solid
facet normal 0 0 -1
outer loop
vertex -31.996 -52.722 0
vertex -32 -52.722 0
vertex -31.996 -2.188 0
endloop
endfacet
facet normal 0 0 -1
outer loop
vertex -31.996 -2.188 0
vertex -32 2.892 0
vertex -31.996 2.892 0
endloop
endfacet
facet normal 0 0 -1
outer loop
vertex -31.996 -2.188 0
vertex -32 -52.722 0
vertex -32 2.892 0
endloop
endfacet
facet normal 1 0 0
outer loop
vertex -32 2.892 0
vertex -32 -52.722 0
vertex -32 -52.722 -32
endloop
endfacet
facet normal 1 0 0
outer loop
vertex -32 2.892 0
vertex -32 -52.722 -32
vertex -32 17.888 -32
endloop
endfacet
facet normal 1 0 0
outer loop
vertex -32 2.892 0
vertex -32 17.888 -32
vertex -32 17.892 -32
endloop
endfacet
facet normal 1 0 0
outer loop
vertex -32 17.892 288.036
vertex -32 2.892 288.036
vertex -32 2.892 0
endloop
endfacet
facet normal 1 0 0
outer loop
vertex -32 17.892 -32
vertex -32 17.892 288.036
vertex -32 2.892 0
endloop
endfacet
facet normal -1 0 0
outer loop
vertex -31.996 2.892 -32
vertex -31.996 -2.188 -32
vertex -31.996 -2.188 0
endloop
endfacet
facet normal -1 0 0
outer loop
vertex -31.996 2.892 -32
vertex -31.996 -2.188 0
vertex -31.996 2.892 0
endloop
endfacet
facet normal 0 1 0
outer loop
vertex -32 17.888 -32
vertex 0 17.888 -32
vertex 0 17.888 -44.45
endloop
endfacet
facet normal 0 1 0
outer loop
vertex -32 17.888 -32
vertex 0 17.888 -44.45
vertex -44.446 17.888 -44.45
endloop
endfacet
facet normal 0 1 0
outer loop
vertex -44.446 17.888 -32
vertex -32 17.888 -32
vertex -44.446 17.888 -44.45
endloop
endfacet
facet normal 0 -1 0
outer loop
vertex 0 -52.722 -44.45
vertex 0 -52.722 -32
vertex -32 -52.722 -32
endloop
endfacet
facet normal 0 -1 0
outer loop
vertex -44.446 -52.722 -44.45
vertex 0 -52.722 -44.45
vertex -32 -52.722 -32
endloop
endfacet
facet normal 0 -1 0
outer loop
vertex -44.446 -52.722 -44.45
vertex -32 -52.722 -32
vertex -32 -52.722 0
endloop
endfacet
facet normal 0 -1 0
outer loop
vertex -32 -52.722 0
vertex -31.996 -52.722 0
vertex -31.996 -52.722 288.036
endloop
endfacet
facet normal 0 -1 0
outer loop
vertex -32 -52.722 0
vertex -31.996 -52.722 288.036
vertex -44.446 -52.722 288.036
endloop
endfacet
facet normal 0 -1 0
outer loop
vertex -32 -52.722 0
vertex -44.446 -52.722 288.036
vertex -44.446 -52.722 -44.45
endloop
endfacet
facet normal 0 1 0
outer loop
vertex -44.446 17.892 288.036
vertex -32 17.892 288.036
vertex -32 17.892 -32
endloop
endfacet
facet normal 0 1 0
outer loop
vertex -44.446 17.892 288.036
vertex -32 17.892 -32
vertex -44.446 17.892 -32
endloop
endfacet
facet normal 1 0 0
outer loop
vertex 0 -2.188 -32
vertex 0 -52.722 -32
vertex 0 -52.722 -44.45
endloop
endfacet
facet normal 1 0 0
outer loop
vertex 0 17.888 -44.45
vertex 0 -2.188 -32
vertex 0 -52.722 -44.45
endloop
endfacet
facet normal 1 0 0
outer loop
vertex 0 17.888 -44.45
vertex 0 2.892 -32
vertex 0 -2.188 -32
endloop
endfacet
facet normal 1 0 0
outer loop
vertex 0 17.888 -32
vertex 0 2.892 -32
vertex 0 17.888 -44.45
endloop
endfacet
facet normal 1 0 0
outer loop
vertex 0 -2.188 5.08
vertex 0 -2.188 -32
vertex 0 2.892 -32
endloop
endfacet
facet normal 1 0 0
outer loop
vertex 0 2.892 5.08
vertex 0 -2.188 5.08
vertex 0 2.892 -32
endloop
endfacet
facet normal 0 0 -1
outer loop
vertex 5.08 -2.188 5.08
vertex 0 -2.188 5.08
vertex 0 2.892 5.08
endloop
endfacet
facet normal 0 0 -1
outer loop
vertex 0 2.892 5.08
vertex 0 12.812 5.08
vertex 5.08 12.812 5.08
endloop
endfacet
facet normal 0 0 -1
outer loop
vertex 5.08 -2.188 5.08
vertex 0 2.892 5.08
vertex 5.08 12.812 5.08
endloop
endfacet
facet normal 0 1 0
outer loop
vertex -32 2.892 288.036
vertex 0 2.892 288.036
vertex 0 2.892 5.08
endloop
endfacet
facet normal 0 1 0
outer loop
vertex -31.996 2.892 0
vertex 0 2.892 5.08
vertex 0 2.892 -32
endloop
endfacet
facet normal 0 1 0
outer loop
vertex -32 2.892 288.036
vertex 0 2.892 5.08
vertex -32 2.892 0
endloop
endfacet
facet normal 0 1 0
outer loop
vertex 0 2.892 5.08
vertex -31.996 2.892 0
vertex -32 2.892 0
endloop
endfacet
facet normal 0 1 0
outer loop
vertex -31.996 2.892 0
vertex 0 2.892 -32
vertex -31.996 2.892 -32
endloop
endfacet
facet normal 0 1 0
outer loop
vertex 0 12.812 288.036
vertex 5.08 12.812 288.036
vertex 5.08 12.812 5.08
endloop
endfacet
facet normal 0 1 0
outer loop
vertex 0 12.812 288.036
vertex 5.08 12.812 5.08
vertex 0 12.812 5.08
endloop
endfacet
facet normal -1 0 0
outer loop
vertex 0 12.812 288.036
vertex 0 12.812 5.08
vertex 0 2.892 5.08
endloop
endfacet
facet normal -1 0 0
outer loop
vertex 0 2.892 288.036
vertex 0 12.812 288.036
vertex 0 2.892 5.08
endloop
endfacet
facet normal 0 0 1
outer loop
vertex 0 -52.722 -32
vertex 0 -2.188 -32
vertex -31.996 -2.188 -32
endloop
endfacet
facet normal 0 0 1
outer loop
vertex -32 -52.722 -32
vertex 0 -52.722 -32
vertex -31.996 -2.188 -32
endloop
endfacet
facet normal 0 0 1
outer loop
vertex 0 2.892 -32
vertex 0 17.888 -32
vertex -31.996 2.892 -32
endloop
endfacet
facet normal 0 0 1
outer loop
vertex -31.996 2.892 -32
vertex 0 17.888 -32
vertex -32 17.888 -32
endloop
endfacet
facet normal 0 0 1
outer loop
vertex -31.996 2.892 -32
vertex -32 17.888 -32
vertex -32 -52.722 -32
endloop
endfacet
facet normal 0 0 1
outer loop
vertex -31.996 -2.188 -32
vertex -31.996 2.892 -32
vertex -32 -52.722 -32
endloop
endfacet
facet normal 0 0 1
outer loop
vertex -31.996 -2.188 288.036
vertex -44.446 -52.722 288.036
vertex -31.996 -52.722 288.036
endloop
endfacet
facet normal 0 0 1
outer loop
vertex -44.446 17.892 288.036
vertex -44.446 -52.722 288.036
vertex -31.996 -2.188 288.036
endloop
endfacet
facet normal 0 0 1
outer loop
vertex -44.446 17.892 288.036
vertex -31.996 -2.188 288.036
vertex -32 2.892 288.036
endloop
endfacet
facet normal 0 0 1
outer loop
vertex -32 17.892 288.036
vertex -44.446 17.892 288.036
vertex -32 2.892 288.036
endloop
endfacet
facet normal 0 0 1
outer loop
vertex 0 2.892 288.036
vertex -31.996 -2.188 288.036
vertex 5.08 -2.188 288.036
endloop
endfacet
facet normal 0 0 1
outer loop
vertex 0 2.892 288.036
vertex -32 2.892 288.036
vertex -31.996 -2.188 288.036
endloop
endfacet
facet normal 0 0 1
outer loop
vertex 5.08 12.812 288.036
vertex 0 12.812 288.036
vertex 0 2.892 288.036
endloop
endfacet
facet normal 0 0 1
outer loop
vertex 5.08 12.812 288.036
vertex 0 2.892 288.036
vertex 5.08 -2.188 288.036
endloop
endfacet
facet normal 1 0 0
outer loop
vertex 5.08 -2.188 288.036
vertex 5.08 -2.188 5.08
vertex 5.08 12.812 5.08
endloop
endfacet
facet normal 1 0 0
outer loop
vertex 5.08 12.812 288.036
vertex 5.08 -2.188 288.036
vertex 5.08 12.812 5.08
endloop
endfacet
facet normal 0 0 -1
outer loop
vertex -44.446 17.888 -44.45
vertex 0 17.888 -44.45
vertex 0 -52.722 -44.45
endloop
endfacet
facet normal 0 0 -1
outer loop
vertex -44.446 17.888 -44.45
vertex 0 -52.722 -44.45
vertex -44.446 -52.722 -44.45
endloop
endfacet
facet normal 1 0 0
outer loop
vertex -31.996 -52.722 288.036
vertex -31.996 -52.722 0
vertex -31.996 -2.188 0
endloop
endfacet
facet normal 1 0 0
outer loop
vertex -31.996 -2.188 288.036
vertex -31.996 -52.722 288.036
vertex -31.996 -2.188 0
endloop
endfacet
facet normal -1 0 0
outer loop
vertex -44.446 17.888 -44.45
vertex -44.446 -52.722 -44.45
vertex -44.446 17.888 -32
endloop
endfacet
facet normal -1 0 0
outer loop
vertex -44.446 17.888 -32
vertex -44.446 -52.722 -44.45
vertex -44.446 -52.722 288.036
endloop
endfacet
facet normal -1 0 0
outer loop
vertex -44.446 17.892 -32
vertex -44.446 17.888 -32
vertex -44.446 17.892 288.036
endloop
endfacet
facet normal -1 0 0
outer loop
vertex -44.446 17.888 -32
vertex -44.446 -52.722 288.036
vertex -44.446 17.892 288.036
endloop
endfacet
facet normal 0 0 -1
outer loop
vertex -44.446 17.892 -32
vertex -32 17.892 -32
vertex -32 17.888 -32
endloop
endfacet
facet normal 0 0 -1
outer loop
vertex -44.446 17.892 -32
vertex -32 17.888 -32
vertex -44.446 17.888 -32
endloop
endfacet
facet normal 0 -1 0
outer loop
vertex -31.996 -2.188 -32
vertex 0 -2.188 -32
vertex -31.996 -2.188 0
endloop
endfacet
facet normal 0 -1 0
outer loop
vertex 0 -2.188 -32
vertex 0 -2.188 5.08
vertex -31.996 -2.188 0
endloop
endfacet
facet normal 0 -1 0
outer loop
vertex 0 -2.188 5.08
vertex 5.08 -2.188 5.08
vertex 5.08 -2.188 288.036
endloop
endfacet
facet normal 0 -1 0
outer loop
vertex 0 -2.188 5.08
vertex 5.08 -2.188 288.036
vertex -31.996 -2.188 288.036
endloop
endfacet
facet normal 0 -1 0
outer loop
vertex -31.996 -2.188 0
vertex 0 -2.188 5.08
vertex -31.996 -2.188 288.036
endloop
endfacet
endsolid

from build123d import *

# Parameters (mm, degrees)
BOSS_EXTRUDE1_DEPTH = 288.036
SKETCH2_W           = 5.08
SKETCH2_H           = 5.08
CUT_EXTRUDE1_DEPTH  = 299.722207266
SKETCH3_W           = 12.446
SKETCH3_H           = 70.614516874
SKETCH3_W_2         = 31.996
SKETCH3_H_2         = 5.08
BOSS_EXTRUDE2_DEPTH = 32
SKETCH7_W           = 44.446
SKETCH7_H           = 70.61
BOSS_EXTRUDE3_DEPTH = 12.45


with BuildPart() as part:
    # Sketch1 → Boss-Extrude1 (new body)
    with BuildSketch(Plane.XY):
        Polygon((-44.446, 17.892402527), (-44.446, -52.722114347), (-31.996, -52.722114347), (-31.996, -2.187597473), (5.08, -2.187597473), (5.08, 12.812402527), (0, 12.812402527), (0, 2.892402527), (-32, 2.892402527), (-32, 17.892402527), align=None)
    extrude(amount=BOSS_EXTRUDE1_DEPTH)

    # Sketch2 → Cut-Extrude1 (cut, through all)
    with BuildSketch(Plane(origin=(0, 12.812402527, 0), x_dir=(1, 0, 0), z_dir=(0, 1, 0))):
        with Locations((2.54, -2.54)):
            Rectangle(SKETCH2_W, SKETCH2_H)
    extrude(amount=-CUT_EXTRUDE1_DEPTH, mode=Mode.SUBTRACT)

    # Sketch3 → Boss-Extrude2 (add)
    with BuildSketch(Plane(origin=(0, 0, 0), x_dir=(-1, 0, 0), z_dir=(0, 0, -1))):
        with Locations((38.223, -17.41485591)):
            Rectangle(SKETCH3_W, SKETCH3_H)
        with Locations((15.998, 0.352402527)):
            Rectangle(SKETCH3_W_2, SKETCH3_H_2)
    extrude(amount=BOSS_EXTRUDE2_DEPTH)

    # Sketch7 → Boss-Extrude3 (add)
    with BuildSketch(Plane(origin=(0, 0, -32), x_dir=(-1, 0, 0), z_dir=(0, 0, -1))):
        with Locations((22.223, -17.417114347)):
            Rectangle(SKETCH7_W, SKETCH7_H)
    extrude(amount=BOSS_EXTRUDE3_DEPTH)


solid = part.part
